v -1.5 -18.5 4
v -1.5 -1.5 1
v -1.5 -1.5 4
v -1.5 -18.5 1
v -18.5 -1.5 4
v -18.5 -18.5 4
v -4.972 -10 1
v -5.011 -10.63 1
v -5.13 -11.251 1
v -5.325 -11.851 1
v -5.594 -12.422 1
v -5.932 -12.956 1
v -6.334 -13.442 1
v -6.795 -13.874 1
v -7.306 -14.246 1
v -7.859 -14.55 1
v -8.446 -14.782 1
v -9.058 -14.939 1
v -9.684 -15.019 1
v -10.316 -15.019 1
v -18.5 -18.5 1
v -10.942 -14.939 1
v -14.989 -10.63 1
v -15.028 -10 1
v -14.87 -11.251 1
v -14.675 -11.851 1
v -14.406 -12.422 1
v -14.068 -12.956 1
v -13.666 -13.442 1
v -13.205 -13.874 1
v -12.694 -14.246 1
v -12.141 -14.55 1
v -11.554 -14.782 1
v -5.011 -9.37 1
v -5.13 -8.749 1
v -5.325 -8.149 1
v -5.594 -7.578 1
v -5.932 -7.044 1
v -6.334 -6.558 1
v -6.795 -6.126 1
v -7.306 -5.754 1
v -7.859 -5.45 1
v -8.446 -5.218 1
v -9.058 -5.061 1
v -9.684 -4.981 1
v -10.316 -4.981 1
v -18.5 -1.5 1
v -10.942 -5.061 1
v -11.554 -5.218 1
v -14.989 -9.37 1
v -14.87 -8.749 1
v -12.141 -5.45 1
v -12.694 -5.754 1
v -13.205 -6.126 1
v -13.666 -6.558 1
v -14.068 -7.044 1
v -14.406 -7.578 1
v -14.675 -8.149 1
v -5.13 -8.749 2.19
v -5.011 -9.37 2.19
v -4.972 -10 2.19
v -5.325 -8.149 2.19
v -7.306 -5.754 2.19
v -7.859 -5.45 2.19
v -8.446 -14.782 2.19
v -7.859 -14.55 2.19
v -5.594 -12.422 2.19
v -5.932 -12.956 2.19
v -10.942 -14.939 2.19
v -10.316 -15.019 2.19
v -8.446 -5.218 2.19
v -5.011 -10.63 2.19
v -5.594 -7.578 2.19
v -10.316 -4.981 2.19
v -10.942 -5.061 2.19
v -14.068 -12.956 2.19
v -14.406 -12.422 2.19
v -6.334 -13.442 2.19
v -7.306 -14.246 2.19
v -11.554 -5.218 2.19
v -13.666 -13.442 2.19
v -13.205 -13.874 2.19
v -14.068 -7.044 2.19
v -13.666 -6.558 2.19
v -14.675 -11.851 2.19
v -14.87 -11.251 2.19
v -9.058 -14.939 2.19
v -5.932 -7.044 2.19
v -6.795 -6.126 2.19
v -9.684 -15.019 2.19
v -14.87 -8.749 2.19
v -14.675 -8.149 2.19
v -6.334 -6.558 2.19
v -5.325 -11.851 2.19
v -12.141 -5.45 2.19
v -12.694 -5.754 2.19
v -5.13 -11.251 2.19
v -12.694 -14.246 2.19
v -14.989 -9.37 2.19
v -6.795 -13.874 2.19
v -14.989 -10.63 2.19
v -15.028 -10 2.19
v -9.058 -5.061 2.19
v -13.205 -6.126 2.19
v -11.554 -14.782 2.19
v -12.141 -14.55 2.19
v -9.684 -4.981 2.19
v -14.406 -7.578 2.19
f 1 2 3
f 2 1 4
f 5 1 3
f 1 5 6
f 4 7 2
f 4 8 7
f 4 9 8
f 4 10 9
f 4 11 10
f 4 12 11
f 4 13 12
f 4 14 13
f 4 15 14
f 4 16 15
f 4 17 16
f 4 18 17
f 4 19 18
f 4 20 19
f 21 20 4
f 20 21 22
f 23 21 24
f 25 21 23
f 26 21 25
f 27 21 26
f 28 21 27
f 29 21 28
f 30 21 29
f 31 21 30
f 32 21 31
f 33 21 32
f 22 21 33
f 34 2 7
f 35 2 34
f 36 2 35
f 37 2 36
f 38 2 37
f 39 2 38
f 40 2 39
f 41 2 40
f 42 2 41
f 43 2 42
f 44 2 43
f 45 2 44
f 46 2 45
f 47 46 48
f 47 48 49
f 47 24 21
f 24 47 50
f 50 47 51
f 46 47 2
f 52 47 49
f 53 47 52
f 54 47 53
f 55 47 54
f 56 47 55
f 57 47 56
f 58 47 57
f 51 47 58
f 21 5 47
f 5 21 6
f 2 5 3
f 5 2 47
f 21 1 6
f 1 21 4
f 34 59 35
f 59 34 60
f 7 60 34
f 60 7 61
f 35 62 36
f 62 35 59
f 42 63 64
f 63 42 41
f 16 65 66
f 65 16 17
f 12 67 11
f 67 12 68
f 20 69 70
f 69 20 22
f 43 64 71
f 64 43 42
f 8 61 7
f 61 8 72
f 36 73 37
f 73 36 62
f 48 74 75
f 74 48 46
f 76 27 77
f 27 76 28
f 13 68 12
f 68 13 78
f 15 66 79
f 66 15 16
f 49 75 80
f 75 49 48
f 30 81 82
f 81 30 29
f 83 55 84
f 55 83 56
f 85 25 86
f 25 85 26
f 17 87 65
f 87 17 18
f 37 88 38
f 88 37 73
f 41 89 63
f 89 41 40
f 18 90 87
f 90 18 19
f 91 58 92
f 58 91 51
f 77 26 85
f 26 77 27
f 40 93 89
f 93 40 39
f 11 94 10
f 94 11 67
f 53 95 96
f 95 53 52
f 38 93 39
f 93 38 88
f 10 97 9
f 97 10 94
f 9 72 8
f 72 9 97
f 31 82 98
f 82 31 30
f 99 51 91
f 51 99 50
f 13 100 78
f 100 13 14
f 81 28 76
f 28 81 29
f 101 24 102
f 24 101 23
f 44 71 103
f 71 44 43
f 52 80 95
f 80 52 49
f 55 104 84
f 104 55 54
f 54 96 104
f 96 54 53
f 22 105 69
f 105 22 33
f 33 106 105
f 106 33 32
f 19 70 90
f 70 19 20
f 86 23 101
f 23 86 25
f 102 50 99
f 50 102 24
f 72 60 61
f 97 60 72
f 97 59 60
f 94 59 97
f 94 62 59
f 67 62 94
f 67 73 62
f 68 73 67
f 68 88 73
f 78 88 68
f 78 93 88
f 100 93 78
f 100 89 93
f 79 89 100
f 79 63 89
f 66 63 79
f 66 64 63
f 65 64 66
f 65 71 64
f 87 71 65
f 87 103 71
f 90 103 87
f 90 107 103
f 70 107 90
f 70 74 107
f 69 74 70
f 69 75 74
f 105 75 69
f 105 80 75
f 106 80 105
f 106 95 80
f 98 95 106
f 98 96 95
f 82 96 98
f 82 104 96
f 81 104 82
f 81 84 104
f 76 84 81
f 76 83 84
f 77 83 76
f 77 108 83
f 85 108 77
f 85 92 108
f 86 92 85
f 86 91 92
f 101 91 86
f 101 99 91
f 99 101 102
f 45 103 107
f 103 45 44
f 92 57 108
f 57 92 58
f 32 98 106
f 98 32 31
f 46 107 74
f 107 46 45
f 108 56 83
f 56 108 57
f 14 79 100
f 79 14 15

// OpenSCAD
n = 4;

fw = 20; // field_width
bh = 2; // board_height
th = 3; // tile_height
mfr = 0.4; // mount_width/field_width ratio
tfr = 0.85; // tile_width/field_width width ratio

ss = 0.2;
sb = 0.3;

// -------------------------

$fn=50;
e = 0.01;
mh = th / 3; // mount_height
mw = fw * mfr; // mount_width
md = (mw + sqrt(2)*mw)/2; // mount_diameter
tw = fw * tfr; // tile_width

d = (n-1)/2 * fw;
d2 = (n+1)/2 * fw;
    
    
//mini_board();
//tile();
clue();

module tile() {
    translate([-d + fw, -d + fw, th/2 + bh/2])
    difference() {
        cube([tw, tw, th], center=true);
        
        translate([0, 0, -th/2 + (mh+sb)/2 - e])
        cube([mw+sb, mw+sb, mh+sb], center=true);
    }
}

module clue() {
    translate([-d + fw, -d + fw, th/2 + bh/2])
    difference() {
        cube([tw, tw, th], center=true);
        
        translate([0, 0, -th/2 + (mh+ss)/2 - e])
        cylinder(d = md + 2*ss, h=mh+ss, center=true);
    }
}

module mini_board() {
    intersection() {
        board();
        
        translate([n/2*fw, n/2*fw, 0])
        cube(2*fw+e, center = true);
    }
}

module board() {
    difference() {
        union(){
            cube([(n+2)*fw, (n+2)*fw, bh], center=true);
            
            for (i = [-1 : n]) {
                for (j = [-1 : n]) {
                    translate([-d + i*fw, -d + j * fw, th/2])
                    if (i == -1 || i == n || j == -1 || j == n) {
                        cylinder(d = md, h=mh+e, center=true);
                    } else {
                        cube([mw, mw, mh + e], center = true);
                    }
                }
            }
        }
        for (i = [-1, 1]) {
            for (j = [-1, 1]) {
                translate([i*d2, j*d2, 0])
                cube(fw+e, center = true);
            }
        }
    }
}
